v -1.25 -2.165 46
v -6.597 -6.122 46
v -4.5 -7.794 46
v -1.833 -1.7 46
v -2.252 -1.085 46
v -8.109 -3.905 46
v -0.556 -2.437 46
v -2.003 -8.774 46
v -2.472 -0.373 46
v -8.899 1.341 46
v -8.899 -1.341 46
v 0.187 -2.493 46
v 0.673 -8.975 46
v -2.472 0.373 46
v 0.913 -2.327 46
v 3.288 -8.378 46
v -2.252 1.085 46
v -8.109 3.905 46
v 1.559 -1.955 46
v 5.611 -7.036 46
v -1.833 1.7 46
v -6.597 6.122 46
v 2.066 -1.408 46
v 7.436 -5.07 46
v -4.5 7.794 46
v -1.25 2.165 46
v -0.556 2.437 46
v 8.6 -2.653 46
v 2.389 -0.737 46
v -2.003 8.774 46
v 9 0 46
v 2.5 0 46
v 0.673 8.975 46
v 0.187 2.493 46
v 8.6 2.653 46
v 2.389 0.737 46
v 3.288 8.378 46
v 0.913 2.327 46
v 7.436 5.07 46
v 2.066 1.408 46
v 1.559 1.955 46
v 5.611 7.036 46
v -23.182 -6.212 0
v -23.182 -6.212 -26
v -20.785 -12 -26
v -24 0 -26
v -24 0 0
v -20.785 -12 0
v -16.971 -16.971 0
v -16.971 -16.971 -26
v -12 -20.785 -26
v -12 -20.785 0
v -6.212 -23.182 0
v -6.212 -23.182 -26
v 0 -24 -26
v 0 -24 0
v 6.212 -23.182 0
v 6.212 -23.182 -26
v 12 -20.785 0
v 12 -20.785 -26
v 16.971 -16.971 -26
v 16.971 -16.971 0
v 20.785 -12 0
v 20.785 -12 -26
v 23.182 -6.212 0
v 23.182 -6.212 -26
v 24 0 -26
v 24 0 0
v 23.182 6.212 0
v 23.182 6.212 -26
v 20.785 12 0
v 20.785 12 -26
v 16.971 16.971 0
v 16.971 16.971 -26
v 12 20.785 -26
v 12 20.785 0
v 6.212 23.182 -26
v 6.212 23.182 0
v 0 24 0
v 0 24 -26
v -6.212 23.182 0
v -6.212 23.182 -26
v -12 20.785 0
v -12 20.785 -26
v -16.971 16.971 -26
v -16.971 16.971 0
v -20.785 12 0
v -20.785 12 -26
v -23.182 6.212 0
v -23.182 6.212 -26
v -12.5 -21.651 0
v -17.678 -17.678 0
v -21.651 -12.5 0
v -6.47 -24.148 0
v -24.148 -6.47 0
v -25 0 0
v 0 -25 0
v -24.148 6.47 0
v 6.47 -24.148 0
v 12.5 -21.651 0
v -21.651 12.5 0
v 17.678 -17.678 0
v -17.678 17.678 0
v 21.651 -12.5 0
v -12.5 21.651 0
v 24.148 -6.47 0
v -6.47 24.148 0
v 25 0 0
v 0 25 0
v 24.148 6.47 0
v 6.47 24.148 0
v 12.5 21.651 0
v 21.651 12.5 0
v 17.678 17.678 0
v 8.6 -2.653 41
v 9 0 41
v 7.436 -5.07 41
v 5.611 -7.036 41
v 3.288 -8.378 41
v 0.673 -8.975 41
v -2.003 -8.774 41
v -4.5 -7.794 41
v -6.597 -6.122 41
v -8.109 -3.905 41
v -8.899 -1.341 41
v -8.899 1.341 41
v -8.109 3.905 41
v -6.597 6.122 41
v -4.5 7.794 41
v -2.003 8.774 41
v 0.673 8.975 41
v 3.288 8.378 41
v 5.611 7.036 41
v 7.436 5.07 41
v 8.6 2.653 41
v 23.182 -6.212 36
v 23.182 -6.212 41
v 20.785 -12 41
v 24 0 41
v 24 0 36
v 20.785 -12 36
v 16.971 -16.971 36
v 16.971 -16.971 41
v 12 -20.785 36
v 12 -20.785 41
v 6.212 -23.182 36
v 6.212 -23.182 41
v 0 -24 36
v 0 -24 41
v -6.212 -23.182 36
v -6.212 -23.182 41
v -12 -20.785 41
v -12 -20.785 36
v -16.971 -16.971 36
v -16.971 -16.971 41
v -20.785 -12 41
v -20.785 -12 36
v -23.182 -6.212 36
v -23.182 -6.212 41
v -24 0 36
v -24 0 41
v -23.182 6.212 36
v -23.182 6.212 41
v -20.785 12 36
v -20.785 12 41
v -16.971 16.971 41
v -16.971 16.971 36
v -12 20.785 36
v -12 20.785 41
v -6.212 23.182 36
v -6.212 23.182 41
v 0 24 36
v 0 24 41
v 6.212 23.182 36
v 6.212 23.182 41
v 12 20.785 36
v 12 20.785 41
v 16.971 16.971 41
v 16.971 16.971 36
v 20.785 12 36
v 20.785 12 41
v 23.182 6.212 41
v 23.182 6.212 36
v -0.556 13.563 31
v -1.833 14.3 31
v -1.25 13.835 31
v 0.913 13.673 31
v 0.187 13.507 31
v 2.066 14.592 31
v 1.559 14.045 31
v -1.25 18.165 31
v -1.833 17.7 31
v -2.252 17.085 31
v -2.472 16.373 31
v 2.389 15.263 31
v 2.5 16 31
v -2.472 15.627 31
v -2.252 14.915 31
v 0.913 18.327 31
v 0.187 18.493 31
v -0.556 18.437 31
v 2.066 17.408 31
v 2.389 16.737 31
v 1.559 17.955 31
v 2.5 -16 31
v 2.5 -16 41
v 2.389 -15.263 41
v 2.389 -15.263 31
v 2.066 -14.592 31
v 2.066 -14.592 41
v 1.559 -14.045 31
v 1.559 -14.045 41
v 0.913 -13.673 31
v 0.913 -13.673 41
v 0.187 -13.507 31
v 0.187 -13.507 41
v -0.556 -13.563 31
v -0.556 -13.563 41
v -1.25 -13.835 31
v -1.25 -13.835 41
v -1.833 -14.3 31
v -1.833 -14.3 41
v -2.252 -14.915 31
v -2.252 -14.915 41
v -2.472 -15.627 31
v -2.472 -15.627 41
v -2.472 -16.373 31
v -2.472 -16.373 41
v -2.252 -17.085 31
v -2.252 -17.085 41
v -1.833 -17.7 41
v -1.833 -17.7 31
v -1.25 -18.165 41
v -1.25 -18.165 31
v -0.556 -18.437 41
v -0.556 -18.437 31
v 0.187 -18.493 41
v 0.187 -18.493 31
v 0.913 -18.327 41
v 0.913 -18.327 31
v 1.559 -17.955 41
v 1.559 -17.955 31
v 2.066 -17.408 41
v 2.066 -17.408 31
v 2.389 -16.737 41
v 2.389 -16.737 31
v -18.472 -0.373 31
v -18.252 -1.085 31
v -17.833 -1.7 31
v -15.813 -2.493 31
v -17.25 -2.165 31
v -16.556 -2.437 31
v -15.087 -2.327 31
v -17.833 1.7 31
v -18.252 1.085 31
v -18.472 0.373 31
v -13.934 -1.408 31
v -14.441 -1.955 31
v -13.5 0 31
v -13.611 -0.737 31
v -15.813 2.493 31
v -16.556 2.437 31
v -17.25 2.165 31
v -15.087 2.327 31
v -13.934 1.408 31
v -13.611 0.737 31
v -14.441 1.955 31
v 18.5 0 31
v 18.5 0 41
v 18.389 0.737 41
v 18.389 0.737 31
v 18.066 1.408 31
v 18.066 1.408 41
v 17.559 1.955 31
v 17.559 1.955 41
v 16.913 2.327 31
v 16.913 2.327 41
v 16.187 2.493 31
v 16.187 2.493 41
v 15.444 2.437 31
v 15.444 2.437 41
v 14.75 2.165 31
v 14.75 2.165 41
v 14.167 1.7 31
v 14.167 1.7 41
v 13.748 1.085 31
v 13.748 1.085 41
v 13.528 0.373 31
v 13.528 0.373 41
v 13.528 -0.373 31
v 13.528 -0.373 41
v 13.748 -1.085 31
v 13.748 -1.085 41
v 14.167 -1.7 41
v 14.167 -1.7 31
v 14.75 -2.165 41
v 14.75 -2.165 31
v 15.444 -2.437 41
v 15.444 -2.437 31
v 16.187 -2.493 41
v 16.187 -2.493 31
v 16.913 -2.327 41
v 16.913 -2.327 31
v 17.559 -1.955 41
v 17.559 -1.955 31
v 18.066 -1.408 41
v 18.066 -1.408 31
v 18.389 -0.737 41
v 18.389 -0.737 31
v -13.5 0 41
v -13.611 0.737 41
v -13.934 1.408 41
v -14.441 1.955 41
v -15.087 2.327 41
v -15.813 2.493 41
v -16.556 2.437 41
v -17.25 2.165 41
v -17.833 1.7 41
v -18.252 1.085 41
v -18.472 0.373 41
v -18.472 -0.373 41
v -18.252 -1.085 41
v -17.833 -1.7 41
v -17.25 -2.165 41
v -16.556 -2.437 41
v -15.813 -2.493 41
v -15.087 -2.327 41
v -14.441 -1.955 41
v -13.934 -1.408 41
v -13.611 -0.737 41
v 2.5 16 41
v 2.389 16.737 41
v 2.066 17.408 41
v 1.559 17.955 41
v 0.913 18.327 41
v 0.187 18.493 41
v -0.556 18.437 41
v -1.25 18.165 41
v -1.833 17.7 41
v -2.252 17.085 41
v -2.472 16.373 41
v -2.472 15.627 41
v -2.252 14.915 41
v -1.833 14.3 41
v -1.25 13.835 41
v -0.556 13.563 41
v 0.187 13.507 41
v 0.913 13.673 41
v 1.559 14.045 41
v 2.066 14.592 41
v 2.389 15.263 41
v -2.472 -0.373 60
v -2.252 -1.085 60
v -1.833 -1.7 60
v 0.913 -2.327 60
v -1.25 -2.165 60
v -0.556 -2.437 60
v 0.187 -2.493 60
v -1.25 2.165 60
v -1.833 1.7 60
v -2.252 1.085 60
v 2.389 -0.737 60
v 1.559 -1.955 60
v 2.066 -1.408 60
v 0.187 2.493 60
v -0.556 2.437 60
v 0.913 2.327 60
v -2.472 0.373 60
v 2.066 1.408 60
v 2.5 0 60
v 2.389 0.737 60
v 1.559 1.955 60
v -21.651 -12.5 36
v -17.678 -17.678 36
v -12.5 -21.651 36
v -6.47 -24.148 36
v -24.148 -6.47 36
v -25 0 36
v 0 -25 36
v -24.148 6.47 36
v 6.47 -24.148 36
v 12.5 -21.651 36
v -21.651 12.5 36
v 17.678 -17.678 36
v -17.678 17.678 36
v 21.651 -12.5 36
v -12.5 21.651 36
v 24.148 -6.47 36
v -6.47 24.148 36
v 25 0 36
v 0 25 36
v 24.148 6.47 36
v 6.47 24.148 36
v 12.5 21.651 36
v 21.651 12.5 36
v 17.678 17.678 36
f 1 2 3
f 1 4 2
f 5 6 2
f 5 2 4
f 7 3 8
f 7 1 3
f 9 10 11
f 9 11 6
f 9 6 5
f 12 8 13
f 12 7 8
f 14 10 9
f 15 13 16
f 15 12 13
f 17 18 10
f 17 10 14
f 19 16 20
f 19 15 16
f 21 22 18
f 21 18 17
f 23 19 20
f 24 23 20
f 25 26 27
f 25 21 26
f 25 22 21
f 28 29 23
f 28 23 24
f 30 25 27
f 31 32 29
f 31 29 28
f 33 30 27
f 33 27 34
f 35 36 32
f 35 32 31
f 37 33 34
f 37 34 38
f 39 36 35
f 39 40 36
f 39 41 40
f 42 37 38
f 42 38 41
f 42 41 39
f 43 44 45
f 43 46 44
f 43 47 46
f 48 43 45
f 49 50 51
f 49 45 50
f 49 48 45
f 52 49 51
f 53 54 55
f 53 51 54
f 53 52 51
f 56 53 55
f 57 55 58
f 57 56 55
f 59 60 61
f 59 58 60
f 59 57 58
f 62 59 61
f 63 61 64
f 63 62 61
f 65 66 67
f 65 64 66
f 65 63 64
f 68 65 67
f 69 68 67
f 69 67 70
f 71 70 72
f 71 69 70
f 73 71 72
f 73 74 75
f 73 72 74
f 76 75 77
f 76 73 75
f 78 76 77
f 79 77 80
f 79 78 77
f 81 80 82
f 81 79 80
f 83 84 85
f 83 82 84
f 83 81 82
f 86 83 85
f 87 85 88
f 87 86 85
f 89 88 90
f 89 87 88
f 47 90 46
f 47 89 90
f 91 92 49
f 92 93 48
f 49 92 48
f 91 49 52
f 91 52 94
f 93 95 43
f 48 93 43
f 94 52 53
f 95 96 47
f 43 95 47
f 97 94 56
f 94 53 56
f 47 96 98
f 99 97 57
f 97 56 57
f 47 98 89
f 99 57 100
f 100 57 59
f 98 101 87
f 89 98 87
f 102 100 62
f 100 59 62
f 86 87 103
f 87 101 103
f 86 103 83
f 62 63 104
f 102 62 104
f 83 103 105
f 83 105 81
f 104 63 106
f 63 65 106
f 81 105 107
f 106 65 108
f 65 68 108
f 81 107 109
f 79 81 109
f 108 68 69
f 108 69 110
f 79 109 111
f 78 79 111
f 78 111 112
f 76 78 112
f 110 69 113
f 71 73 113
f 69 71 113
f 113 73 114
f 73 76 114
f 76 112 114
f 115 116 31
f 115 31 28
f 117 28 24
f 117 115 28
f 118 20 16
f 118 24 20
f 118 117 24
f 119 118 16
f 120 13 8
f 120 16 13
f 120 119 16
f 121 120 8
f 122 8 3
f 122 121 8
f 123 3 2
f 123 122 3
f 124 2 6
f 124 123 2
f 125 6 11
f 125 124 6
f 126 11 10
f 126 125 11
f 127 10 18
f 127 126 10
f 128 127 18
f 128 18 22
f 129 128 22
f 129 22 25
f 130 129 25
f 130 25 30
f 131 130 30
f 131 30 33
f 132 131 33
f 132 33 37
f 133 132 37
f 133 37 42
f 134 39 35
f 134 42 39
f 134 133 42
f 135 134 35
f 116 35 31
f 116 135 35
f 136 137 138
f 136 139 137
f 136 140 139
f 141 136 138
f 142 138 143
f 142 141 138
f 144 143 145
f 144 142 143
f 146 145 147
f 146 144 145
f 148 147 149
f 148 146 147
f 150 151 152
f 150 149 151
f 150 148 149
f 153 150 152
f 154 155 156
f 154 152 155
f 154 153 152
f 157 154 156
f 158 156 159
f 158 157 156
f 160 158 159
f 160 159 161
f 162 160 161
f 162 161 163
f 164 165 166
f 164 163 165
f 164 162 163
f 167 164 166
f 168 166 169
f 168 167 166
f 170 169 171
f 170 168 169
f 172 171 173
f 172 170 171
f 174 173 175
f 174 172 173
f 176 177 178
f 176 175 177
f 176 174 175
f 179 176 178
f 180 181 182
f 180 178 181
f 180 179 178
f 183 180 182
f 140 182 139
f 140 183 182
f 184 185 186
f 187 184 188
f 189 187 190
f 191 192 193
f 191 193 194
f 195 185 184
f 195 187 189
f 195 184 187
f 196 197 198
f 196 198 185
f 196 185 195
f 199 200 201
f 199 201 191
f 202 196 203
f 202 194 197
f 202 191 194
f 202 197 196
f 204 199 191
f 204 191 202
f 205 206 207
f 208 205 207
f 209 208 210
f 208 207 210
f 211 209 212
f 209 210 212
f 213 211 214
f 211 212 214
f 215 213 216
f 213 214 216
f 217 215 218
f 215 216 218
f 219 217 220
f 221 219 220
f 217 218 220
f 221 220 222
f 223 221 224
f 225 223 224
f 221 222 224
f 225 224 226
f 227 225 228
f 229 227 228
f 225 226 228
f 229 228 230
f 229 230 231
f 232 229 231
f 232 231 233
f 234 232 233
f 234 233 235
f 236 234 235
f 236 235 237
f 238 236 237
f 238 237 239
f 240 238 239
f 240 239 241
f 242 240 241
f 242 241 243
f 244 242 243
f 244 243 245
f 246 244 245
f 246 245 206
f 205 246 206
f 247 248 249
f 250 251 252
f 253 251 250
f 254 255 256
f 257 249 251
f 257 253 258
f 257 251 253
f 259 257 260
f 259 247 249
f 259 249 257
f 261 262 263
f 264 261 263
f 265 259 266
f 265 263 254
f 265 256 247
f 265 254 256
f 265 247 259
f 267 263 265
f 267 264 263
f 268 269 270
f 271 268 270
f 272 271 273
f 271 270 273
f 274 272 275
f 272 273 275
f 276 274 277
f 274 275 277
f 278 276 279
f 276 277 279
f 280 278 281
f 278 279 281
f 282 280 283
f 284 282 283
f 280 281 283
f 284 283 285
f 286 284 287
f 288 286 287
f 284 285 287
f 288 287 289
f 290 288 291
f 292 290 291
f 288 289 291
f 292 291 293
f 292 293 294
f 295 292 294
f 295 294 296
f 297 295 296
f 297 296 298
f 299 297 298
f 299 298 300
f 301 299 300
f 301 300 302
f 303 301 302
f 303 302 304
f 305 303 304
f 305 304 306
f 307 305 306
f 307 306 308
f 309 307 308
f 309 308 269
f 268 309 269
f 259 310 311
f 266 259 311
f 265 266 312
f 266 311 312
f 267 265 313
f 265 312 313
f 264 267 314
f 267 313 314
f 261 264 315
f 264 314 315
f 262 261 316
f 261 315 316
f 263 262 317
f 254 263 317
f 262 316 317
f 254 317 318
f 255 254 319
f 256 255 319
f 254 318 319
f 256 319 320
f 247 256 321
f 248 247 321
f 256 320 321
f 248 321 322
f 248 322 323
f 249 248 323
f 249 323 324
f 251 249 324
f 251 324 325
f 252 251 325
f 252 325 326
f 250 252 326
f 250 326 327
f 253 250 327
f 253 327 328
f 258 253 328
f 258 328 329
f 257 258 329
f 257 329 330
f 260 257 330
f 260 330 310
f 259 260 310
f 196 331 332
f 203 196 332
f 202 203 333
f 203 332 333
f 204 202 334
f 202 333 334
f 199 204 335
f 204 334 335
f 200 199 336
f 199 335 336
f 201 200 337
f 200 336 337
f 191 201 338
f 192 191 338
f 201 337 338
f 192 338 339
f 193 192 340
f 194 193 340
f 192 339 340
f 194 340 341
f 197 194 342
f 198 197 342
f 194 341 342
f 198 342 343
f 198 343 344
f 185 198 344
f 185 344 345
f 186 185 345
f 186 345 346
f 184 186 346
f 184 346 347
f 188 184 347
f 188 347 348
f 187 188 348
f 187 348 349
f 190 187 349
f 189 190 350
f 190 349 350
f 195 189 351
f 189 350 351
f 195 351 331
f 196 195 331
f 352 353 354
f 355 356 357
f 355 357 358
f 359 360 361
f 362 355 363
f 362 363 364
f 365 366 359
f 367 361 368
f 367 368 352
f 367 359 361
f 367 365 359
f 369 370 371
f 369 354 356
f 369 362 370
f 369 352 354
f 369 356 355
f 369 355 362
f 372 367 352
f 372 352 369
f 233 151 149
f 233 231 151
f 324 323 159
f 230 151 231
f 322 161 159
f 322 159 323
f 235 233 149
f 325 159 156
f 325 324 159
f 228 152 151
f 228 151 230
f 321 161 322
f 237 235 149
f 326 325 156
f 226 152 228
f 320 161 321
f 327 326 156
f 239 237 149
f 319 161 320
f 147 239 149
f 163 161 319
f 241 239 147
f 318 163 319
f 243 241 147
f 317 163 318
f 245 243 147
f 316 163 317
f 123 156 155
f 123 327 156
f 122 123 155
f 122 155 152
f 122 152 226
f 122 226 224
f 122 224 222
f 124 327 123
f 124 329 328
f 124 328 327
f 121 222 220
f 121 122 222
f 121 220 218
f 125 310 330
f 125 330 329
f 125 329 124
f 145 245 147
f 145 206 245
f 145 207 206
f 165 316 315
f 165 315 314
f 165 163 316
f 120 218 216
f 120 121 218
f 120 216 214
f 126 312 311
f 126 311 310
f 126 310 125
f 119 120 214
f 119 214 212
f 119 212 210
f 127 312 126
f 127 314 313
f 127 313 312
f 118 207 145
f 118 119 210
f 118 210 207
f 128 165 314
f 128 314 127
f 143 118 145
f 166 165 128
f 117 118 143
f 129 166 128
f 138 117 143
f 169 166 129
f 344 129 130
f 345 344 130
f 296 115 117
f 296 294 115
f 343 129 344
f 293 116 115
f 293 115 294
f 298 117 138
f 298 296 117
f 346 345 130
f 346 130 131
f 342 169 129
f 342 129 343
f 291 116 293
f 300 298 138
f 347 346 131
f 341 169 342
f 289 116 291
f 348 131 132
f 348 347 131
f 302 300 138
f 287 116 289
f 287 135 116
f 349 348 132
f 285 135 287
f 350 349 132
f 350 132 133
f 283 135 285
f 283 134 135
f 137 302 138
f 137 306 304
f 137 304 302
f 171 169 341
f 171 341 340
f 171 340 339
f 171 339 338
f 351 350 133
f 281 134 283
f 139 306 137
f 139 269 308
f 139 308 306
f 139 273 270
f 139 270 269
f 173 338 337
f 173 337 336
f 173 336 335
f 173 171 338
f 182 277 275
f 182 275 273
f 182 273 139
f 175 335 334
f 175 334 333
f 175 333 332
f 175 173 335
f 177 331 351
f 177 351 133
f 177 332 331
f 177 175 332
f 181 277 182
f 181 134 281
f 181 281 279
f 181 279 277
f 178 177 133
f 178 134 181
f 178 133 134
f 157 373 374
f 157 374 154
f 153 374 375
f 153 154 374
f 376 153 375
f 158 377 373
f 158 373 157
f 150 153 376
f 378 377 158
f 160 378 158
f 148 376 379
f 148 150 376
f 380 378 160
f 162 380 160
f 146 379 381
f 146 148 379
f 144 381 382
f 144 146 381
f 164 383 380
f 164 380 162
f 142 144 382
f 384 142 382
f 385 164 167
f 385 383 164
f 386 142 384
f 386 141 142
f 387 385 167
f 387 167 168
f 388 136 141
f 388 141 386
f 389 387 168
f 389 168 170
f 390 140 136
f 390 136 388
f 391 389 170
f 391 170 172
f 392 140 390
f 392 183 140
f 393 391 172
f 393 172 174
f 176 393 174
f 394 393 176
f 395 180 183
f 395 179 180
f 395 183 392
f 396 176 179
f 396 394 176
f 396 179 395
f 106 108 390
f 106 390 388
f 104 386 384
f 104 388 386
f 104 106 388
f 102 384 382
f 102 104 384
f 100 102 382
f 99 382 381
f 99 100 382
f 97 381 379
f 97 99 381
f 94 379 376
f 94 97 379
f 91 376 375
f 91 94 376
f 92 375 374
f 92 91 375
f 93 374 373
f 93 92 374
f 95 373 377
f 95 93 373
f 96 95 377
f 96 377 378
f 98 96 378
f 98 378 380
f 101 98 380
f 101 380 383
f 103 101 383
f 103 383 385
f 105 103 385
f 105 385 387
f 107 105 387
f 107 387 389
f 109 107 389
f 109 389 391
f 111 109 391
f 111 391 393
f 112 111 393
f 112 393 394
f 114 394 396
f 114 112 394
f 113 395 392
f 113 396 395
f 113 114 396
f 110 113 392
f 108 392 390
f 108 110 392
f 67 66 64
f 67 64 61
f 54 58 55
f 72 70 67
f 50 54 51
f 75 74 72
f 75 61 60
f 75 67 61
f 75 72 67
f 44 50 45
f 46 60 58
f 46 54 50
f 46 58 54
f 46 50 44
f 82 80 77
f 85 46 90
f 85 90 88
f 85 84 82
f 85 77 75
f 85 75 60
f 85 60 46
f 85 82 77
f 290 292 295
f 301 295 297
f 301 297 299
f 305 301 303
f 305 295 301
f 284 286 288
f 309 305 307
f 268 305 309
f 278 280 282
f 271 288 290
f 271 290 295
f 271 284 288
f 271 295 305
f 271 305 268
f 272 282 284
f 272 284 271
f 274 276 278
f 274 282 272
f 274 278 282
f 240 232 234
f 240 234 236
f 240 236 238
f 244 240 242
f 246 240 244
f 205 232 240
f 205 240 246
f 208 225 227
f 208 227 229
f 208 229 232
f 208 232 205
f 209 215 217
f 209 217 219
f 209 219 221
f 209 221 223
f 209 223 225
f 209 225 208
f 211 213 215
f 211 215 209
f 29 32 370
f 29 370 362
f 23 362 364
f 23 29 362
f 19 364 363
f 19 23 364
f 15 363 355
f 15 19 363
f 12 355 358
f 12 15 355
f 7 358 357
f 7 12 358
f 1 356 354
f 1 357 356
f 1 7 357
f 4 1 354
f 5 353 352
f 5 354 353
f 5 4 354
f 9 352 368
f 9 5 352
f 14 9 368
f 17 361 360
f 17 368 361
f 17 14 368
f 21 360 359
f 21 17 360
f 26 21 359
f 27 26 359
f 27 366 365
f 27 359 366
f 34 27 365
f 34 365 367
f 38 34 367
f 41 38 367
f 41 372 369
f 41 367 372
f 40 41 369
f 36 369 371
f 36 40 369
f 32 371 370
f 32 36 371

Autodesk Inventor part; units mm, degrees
ref_plane "YZ Plane" through (0, 0, 0) normal (1, 0, 0) x (0, 1, 0)
ref_plane "XZ Plane" through (0, 0, 0) normal (0, 1, 0) x (-1, 0, 0)
ref_plane "XY Plane" through (0, 0, 0) normal (0, 0, 1) x (1, 0, 0)
sketch "Sketch1" plane through (0, 0, 0) normal (0, 0, 1) x (1, 0, 0)
  circle A0 centre (0, 0) radius 25
  dimension "d0" = 50
extrude "Extrusion1" add sketch "Sketch1" along normal blind 36
sketch "Sketch2" plane through (0, 0, 36) normal (0, 0, 1) x (1, 0, 0)
  circle A0 centre (0, 0) radius 24
  dimension "d3" = 48
extrude "Extrusion2" add sketch "Sketch2" along normal blind 5
sketch "Sketch3" plane through (0, 0, 0) normal (0, 0, -1) x (-1, 0, 0)
  circle A0 centre (0, 0) radius 24
  dimension "d6" = 48
extrude "Extrusion3" add sketch "Sketch3" along normal blind 26
sketch "Sketch4" plane through (0, 0, 41) normal (0, 0, 1) x (1, 0, 0)
  circle A0 centre (0, 0) radius 9
  dimension "d9" = 18
extrude "Extrusion4" add sketch "Sketch4" along normal blind 5
sketch "Sketch5" plane through (0, 0, 46) normal (0, 0, 1) x (1, 0, 0)
  circle A0 centre (0, 0) radius 2.5
  dimension "d12" = 5
extrude "Extrusion5" add sketch "Sketch5" along normal blind 14
sketch "Sketch6" plane through (0, 0, 41) normal (0, 0, 1) x (1, 0, 0)
  circle A0 centre (0, 0) radius 2.5 projected
  circle A1 centre (0, 0) radius 16
  circle A2 centre (16, 0) radius 2.5
  circle A3 centre (0, 16) radius 2.5
  circle A4 centre (-16, 0) radius 2.5
  circle A5 centre (0, -16) radius 2.5
  dimension "d15" = 32
  dimension "d16" = 5
  dimension "d19" = 360
extrude "Extrusion6" cut sketch "Sketch6" against normal blind 10 contours A1 A2 | A1 A2 | A3 A1 | A1 A3 | A5 A1 | A1 A5 | A4 A1 | A1 A4
properties part number "MOTOR 895"
